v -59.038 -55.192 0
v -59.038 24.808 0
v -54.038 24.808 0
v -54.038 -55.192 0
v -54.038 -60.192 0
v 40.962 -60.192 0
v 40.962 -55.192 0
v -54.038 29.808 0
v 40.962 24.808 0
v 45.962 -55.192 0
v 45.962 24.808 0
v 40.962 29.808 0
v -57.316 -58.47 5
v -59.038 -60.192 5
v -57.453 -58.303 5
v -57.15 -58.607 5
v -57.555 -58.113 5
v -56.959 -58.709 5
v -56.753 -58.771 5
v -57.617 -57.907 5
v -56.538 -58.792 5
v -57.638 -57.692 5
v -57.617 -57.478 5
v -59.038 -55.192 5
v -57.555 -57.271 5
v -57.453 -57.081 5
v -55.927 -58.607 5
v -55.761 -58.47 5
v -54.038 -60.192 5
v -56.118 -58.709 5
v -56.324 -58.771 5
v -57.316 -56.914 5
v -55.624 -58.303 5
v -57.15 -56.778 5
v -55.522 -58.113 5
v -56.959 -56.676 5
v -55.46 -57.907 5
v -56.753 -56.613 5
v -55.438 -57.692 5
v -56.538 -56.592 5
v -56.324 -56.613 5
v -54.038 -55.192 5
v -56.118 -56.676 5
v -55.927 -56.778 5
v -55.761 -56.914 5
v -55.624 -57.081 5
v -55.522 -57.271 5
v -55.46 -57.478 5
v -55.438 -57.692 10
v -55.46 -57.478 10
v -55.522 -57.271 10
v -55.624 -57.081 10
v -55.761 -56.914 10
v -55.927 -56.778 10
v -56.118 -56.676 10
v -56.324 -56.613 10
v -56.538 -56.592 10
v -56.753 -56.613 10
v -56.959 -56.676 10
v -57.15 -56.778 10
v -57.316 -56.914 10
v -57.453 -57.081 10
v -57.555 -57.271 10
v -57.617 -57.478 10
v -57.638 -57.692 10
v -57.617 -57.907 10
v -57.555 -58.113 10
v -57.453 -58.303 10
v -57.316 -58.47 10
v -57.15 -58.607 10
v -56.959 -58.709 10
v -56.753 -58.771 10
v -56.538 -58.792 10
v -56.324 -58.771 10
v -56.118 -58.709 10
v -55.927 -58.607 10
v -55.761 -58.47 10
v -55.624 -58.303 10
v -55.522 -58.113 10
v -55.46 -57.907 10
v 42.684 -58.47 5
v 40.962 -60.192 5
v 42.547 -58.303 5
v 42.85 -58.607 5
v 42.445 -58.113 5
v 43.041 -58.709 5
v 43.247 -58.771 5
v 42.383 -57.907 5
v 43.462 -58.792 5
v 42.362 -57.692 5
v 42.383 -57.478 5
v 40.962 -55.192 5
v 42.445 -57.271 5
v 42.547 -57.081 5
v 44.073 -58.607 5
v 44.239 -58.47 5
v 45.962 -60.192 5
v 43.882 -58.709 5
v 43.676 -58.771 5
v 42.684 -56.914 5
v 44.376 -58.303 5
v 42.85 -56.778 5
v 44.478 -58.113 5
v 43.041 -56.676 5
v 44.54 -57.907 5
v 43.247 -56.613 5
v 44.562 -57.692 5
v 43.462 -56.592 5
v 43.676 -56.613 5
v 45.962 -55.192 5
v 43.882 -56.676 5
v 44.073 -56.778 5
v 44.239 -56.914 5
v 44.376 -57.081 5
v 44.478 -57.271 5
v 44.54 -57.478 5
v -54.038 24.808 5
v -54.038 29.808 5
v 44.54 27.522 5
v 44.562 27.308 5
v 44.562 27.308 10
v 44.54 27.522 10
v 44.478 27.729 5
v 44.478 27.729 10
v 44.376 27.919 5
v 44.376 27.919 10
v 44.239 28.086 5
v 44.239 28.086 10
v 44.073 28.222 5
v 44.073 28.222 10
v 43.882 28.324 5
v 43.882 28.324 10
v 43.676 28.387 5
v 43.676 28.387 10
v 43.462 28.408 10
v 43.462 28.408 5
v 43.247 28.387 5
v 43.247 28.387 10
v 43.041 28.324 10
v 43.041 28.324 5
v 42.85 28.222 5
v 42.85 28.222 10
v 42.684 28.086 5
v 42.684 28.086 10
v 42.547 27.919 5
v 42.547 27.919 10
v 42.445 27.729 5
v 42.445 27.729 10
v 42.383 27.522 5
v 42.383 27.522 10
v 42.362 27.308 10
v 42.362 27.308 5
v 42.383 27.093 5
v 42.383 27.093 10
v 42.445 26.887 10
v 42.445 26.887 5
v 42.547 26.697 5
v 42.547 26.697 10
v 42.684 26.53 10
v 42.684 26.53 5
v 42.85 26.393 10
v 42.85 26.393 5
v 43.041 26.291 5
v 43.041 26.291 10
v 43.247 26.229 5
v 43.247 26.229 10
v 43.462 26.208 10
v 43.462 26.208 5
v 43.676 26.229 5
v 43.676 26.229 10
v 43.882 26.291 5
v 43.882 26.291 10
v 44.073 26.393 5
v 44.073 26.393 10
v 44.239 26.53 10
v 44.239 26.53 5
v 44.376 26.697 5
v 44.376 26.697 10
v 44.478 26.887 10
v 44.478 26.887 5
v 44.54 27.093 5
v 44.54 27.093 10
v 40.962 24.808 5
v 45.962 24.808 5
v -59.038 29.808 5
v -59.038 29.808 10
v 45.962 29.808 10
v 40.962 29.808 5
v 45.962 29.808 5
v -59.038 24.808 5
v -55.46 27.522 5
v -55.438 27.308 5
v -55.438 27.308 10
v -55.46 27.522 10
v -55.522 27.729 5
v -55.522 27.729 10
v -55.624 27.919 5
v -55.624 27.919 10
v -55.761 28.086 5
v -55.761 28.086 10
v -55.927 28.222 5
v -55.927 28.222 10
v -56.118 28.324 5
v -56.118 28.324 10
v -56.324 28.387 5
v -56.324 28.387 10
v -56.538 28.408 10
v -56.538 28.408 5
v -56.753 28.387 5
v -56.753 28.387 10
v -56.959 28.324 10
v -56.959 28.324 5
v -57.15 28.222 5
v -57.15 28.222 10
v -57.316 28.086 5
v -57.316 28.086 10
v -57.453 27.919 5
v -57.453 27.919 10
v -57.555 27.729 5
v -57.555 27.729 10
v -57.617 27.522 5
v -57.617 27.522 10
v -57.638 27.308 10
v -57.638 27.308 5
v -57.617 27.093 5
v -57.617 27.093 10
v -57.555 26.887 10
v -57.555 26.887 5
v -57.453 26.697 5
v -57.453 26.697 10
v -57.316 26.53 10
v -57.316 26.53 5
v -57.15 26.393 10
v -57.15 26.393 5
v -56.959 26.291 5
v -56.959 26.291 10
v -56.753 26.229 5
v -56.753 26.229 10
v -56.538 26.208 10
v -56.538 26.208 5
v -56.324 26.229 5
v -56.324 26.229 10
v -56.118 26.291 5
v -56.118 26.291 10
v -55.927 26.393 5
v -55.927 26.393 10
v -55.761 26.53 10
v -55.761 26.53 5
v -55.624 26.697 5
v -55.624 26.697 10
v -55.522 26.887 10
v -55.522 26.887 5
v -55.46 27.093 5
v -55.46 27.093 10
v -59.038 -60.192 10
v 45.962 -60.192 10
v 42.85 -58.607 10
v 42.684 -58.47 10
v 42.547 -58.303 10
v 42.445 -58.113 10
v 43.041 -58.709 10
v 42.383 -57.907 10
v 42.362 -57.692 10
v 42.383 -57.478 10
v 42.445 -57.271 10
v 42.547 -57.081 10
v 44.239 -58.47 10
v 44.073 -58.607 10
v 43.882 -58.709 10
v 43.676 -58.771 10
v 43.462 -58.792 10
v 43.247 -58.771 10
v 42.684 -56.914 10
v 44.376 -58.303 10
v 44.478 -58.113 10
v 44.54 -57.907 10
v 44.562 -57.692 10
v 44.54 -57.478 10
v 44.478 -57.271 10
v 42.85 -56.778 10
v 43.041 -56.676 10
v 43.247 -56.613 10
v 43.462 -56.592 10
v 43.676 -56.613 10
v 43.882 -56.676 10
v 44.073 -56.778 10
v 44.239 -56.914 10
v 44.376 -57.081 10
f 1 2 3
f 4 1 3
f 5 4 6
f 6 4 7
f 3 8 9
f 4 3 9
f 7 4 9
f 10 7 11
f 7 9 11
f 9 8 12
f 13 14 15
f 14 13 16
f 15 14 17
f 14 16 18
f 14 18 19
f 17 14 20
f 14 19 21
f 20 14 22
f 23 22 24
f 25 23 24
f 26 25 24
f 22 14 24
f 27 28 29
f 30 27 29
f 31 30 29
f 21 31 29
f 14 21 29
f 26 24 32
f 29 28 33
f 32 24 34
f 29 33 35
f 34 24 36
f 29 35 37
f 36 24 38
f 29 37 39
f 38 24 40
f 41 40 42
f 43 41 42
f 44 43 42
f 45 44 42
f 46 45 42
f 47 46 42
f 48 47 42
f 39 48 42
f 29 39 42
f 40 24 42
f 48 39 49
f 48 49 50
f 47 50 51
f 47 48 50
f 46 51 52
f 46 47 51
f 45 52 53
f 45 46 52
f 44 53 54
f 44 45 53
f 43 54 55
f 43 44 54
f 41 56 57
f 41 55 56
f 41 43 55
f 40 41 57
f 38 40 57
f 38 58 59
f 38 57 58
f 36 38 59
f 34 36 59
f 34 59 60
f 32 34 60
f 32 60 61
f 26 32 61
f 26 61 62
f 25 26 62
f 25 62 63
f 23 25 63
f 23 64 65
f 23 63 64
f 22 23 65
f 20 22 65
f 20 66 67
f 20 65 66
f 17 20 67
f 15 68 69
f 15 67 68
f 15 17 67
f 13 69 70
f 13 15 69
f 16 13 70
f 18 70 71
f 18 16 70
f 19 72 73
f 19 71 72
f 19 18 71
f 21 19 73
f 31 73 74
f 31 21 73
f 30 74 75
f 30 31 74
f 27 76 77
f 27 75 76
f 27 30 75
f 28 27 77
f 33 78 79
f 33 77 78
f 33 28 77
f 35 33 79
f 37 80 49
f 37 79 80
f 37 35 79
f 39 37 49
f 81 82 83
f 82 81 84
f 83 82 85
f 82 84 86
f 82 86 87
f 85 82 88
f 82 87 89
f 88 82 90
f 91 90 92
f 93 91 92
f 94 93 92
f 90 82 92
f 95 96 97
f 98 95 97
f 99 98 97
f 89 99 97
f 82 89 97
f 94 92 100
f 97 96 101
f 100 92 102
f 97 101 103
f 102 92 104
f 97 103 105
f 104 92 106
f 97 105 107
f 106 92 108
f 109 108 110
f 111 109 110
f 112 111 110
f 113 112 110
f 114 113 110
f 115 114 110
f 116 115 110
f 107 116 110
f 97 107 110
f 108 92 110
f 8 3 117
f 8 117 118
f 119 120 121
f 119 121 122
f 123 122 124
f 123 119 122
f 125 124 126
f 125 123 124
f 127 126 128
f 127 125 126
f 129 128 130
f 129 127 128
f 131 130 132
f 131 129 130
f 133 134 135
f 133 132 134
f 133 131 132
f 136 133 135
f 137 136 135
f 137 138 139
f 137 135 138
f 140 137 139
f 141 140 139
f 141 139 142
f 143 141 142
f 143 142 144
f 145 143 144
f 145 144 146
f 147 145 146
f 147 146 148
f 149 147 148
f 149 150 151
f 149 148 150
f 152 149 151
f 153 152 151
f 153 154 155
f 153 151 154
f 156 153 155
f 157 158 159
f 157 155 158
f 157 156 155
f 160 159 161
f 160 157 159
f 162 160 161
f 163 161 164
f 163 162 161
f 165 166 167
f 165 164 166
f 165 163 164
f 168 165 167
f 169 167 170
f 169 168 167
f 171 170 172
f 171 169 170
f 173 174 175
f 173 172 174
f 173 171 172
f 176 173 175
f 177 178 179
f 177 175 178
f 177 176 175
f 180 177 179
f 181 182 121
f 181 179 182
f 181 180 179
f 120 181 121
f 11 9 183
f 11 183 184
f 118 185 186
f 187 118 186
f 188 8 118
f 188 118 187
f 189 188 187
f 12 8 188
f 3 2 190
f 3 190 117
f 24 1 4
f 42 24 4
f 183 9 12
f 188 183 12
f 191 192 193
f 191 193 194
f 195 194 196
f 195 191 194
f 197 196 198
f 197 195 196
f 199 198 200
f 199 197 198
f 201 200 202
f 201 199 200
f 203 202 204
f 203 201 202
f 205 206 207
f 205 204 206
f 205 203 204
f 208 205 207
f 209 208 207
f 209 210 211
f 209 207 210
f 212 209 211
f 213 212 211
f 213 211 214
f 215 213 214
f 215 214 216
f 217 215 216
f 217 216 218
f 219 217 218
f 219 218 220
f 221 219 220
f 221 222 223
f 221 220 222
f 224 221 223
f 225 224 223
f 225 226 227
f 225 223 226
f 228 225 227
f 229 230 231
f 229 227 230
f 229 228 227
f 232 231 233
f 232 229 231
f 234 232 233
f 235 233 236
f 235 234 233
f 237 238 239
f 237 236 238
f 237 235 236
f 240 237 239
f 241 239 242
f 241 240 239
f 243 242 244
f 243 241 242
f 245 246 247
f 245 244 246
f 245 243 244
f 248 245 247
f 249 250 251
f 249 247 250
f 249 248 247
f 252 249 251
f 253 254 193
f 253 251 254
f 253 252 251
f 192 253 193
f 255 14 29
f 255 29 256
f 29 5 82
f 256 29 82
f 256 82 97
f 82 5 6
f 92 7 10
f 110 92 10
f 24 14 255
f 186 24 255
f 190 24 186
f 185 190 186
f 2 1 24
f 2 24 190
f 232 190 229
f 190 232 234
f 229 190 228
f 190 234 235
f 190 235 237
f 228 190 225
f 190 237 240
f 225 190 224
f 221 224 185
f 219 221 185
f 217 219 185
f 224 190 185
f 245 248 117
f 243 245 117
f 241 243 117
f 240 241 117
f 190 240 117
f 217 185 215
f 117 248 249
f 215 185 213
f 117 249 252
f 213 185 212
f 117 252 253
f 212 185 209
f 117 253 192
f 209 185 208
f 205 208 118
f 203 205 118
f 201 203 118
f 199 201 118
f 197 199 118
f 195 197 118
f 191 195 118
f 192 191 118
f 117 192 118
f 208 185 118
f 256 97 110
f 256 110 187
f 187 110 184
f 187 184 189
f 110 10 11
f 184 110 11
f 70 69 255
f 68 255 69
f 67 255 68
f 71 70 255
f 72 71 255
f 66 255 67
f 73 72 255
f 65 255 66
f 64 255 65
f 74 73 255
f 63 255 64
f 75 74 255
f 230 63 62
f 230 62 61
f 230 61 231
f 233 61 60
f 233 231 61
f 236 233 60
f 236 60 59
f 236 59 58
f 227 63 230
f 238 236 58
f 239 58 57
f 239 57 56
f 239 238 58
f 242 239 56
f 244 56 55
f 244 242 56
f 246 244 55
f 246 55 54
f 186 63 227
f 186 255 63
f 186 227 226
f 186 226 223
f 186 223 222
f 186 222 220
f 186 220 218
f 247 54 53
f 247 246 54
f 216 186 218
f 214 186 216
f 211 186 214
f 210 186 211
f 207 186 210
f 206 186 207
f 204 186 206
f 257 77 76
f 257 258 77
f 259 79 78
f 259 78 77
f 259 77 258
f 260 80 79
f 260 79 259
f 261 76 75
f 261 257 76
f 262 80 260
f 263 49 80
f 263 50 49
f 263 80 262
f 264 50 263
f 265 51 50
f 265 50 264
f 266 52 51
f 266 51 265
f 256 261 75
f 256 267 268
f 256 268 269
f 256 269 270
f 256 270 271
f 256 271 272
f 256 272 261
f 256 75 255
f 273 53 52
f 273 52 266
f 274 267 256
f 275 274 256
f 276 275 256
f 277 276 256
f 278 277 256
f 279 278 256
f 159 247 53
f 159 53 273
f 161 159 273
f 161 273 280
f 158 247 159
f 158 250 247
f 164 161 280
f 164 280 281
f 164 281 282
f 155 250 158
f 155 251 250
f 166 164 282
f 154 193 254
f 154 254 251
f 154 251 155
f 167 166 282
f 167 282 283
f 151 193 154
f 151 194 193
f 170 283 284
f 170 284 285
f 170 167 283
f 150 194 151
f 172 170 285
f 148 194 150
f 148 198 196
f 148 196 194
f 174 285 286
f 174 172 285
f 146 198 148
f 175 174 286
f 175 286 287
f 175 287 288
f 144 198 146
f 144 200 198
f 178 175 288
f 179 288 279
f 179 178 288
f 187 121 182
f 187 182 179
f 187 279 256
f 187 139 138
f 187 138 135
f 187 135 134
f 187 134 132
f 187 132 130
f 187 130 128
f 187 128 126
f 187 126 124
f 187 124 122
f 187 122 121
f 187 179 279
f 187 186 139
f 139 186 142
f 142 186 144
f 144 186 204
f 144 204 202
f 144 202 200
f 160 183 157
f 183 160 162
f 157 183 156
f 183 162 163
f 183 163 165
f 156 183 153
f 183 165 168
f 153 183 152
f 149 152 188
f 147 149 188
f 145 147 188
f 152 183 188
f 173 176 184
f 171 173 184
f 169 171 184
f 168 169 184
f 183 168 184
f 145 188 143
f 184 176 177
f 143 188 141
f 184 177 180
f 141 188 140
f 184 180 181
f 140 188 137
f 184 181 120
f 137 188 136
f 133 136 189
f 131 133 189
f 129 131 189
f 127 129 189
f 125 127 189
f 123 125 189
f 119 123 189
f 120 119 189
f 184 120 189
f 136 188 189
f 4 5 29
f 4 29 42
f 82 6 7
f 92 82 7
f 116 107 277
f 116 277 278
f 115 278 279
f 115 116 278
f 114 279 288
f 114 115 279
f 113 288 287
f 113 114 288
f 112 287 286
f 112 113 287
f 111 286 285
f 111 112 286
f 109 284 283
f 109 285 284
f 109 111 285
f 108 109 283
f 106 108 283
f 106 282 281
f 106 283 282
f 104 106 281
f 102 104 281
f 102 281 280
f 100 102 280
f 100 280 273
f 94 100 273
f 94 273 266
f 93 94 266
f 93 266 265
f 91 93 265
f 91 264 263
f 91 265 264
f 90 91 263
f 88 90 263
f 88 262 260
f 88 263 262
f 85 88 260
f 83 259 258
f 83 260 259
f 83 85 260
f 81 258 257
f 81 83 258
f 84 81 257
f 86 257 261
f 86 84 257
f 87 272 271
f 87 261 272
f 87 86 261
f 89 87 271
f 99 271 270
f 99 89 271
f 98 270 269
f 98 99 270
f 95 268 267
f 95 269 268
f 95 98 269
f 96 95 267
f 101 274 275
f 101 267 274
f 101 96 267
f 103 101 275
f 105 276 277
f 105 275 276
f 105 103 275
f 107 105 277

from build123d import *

# Parameters (mm, degrees)
SKETCH_1_W          = 105
SKETCH_1_H          = 90
EXTRUDE_1_DEPTH     = 10
SKETCH_3_W          = 5
SKETCH_3_H          = 5
CUT_EXTRUDE_1_DEPTH = 5
SKETCH_4_R          = 1.1
CUT_EXTRUDE_2_DEPTH = 33.2


with BuildPart() as part:
    # 草圖1 → 填料-伸長1 (new body)
    with BuildSketch(Plane.XY):
        with Locations((-6.538461538, -15.192307692)):
            Rectangle(SKETCH_1_W, SKETCH_1_H)
    extrude(amount=EXTRUDE_1_DEPTH)

    # 草圖3 → 除料-伸長1 (cut)
    with BuildSketch(Plane.XY):
        with Locations((43.461538462, -57.692307692)):
            Rectangle(SKETCH_3_W, SKETCH_3_H)
        with Locations((-56.538461538, -57.692307692)):
            Rectangle(SKETCH_3_W, SKETCH_3_H)
        with Locations((43.461538462, 27.307692308)):
            Rectangle(SKETCH_3_W, SKETCH_3_H)
        with Locations((-56.538461538, 27.307692308)):
            Rectangle(SKETCH_3_W, SKETCH_3_H)
    extrude(amount=CUT_EXTRUDE_1_DEPTH, mode=Mode.SUBTRACT)

    # 草圖4 → 除料-伸長2 (cut)
    with BuildSketch(Plane.XY):
        with Locations((-56.538461538, -57.692307692)):
            Circle(SKETCH_4_R)
        with Locations((43.461538462, -57.692307692)):
            Circle(SKETCH_4_R)
        with Locations((43.461538462, 27.307692308)):
            Circle(SKETCH_4_R)
        with Locations((-56.538461538, 27.307692308)):
            Circle(SKETCH_4_R)
    extrude(amount=CUT_EXTRUDE_2_DEPTH, mode=Mode.SUBTRACT)


solid = part.part
